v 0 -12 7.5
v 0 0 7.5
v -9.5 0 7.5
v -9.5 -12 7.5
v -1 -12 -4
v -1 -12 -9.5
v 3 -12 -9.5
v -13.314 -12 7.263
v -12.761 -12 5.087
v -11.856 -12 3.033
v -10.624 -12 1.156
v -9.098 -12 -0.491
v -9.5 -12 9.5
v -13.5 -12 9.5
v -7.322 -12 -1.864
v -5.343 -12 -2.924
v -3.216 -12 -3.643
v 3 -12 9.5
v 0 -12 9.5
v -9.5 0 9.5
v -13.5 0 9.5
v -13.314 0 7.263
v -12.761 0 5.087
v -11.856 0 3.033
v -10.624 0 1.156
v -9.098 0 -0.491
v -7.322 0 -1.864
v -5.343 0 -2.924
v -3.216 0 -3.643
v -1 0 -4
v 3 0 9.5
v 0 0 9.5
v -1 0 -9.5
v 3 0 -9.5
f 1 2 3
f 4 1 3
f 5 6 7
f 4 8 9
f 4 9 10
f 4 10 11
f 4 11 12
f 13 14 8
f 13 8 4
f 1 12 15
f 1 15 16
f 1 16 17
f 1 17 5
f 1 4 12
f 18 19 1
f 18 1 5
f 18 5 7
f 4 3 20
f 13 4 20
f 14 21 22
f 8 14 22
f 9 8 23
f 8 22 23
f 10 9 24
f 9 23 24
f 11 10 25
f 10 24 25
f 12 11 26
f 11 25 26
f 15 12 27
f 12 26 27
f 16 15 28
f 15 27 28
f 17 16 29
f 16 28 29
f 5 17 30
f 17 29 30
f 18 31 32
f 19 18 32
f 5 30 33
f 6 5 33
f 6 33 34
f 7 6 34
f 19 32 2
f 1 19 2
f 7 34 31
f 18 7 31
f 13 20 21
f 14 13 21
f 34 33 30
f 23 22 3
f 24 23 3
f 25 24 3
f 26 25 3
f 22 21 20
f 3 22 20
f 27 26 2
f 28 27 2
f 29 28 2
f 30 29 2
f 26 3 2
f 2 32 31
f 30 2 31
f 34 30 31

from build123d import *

# Parameters (mm, degrees)
F1_DEPTH = 12


with BuildPart() as f1:
    # F0 (on Front) → F1 (new body)
    with BuildSketch(Plane.XZ):
        with BuildLine():
            Line((0, -9.5), (0, 7.5))
            Line((0, 7.5), (-9.5, 7.5))
            Line((-9.5, 7.5), (-9.5, 9.5))
            Line((-9.5, 9.5), (-13.5, 9.5))
            ThreePointArc((-13.5, 9.5), (-9.89512, 0.300815), (-1, -4))
            Line((-1, -4), (-1, -9.5))
            Line((-1, -9.5), (0, -9.5))
        make_face()
        Polygon((3, 9.5), (0, 9.5), (0, 7.5), (0, -9.5), (3, -9.5), align=None)
    extrude(amount=F1_DEPTH)


solid = f1.part
